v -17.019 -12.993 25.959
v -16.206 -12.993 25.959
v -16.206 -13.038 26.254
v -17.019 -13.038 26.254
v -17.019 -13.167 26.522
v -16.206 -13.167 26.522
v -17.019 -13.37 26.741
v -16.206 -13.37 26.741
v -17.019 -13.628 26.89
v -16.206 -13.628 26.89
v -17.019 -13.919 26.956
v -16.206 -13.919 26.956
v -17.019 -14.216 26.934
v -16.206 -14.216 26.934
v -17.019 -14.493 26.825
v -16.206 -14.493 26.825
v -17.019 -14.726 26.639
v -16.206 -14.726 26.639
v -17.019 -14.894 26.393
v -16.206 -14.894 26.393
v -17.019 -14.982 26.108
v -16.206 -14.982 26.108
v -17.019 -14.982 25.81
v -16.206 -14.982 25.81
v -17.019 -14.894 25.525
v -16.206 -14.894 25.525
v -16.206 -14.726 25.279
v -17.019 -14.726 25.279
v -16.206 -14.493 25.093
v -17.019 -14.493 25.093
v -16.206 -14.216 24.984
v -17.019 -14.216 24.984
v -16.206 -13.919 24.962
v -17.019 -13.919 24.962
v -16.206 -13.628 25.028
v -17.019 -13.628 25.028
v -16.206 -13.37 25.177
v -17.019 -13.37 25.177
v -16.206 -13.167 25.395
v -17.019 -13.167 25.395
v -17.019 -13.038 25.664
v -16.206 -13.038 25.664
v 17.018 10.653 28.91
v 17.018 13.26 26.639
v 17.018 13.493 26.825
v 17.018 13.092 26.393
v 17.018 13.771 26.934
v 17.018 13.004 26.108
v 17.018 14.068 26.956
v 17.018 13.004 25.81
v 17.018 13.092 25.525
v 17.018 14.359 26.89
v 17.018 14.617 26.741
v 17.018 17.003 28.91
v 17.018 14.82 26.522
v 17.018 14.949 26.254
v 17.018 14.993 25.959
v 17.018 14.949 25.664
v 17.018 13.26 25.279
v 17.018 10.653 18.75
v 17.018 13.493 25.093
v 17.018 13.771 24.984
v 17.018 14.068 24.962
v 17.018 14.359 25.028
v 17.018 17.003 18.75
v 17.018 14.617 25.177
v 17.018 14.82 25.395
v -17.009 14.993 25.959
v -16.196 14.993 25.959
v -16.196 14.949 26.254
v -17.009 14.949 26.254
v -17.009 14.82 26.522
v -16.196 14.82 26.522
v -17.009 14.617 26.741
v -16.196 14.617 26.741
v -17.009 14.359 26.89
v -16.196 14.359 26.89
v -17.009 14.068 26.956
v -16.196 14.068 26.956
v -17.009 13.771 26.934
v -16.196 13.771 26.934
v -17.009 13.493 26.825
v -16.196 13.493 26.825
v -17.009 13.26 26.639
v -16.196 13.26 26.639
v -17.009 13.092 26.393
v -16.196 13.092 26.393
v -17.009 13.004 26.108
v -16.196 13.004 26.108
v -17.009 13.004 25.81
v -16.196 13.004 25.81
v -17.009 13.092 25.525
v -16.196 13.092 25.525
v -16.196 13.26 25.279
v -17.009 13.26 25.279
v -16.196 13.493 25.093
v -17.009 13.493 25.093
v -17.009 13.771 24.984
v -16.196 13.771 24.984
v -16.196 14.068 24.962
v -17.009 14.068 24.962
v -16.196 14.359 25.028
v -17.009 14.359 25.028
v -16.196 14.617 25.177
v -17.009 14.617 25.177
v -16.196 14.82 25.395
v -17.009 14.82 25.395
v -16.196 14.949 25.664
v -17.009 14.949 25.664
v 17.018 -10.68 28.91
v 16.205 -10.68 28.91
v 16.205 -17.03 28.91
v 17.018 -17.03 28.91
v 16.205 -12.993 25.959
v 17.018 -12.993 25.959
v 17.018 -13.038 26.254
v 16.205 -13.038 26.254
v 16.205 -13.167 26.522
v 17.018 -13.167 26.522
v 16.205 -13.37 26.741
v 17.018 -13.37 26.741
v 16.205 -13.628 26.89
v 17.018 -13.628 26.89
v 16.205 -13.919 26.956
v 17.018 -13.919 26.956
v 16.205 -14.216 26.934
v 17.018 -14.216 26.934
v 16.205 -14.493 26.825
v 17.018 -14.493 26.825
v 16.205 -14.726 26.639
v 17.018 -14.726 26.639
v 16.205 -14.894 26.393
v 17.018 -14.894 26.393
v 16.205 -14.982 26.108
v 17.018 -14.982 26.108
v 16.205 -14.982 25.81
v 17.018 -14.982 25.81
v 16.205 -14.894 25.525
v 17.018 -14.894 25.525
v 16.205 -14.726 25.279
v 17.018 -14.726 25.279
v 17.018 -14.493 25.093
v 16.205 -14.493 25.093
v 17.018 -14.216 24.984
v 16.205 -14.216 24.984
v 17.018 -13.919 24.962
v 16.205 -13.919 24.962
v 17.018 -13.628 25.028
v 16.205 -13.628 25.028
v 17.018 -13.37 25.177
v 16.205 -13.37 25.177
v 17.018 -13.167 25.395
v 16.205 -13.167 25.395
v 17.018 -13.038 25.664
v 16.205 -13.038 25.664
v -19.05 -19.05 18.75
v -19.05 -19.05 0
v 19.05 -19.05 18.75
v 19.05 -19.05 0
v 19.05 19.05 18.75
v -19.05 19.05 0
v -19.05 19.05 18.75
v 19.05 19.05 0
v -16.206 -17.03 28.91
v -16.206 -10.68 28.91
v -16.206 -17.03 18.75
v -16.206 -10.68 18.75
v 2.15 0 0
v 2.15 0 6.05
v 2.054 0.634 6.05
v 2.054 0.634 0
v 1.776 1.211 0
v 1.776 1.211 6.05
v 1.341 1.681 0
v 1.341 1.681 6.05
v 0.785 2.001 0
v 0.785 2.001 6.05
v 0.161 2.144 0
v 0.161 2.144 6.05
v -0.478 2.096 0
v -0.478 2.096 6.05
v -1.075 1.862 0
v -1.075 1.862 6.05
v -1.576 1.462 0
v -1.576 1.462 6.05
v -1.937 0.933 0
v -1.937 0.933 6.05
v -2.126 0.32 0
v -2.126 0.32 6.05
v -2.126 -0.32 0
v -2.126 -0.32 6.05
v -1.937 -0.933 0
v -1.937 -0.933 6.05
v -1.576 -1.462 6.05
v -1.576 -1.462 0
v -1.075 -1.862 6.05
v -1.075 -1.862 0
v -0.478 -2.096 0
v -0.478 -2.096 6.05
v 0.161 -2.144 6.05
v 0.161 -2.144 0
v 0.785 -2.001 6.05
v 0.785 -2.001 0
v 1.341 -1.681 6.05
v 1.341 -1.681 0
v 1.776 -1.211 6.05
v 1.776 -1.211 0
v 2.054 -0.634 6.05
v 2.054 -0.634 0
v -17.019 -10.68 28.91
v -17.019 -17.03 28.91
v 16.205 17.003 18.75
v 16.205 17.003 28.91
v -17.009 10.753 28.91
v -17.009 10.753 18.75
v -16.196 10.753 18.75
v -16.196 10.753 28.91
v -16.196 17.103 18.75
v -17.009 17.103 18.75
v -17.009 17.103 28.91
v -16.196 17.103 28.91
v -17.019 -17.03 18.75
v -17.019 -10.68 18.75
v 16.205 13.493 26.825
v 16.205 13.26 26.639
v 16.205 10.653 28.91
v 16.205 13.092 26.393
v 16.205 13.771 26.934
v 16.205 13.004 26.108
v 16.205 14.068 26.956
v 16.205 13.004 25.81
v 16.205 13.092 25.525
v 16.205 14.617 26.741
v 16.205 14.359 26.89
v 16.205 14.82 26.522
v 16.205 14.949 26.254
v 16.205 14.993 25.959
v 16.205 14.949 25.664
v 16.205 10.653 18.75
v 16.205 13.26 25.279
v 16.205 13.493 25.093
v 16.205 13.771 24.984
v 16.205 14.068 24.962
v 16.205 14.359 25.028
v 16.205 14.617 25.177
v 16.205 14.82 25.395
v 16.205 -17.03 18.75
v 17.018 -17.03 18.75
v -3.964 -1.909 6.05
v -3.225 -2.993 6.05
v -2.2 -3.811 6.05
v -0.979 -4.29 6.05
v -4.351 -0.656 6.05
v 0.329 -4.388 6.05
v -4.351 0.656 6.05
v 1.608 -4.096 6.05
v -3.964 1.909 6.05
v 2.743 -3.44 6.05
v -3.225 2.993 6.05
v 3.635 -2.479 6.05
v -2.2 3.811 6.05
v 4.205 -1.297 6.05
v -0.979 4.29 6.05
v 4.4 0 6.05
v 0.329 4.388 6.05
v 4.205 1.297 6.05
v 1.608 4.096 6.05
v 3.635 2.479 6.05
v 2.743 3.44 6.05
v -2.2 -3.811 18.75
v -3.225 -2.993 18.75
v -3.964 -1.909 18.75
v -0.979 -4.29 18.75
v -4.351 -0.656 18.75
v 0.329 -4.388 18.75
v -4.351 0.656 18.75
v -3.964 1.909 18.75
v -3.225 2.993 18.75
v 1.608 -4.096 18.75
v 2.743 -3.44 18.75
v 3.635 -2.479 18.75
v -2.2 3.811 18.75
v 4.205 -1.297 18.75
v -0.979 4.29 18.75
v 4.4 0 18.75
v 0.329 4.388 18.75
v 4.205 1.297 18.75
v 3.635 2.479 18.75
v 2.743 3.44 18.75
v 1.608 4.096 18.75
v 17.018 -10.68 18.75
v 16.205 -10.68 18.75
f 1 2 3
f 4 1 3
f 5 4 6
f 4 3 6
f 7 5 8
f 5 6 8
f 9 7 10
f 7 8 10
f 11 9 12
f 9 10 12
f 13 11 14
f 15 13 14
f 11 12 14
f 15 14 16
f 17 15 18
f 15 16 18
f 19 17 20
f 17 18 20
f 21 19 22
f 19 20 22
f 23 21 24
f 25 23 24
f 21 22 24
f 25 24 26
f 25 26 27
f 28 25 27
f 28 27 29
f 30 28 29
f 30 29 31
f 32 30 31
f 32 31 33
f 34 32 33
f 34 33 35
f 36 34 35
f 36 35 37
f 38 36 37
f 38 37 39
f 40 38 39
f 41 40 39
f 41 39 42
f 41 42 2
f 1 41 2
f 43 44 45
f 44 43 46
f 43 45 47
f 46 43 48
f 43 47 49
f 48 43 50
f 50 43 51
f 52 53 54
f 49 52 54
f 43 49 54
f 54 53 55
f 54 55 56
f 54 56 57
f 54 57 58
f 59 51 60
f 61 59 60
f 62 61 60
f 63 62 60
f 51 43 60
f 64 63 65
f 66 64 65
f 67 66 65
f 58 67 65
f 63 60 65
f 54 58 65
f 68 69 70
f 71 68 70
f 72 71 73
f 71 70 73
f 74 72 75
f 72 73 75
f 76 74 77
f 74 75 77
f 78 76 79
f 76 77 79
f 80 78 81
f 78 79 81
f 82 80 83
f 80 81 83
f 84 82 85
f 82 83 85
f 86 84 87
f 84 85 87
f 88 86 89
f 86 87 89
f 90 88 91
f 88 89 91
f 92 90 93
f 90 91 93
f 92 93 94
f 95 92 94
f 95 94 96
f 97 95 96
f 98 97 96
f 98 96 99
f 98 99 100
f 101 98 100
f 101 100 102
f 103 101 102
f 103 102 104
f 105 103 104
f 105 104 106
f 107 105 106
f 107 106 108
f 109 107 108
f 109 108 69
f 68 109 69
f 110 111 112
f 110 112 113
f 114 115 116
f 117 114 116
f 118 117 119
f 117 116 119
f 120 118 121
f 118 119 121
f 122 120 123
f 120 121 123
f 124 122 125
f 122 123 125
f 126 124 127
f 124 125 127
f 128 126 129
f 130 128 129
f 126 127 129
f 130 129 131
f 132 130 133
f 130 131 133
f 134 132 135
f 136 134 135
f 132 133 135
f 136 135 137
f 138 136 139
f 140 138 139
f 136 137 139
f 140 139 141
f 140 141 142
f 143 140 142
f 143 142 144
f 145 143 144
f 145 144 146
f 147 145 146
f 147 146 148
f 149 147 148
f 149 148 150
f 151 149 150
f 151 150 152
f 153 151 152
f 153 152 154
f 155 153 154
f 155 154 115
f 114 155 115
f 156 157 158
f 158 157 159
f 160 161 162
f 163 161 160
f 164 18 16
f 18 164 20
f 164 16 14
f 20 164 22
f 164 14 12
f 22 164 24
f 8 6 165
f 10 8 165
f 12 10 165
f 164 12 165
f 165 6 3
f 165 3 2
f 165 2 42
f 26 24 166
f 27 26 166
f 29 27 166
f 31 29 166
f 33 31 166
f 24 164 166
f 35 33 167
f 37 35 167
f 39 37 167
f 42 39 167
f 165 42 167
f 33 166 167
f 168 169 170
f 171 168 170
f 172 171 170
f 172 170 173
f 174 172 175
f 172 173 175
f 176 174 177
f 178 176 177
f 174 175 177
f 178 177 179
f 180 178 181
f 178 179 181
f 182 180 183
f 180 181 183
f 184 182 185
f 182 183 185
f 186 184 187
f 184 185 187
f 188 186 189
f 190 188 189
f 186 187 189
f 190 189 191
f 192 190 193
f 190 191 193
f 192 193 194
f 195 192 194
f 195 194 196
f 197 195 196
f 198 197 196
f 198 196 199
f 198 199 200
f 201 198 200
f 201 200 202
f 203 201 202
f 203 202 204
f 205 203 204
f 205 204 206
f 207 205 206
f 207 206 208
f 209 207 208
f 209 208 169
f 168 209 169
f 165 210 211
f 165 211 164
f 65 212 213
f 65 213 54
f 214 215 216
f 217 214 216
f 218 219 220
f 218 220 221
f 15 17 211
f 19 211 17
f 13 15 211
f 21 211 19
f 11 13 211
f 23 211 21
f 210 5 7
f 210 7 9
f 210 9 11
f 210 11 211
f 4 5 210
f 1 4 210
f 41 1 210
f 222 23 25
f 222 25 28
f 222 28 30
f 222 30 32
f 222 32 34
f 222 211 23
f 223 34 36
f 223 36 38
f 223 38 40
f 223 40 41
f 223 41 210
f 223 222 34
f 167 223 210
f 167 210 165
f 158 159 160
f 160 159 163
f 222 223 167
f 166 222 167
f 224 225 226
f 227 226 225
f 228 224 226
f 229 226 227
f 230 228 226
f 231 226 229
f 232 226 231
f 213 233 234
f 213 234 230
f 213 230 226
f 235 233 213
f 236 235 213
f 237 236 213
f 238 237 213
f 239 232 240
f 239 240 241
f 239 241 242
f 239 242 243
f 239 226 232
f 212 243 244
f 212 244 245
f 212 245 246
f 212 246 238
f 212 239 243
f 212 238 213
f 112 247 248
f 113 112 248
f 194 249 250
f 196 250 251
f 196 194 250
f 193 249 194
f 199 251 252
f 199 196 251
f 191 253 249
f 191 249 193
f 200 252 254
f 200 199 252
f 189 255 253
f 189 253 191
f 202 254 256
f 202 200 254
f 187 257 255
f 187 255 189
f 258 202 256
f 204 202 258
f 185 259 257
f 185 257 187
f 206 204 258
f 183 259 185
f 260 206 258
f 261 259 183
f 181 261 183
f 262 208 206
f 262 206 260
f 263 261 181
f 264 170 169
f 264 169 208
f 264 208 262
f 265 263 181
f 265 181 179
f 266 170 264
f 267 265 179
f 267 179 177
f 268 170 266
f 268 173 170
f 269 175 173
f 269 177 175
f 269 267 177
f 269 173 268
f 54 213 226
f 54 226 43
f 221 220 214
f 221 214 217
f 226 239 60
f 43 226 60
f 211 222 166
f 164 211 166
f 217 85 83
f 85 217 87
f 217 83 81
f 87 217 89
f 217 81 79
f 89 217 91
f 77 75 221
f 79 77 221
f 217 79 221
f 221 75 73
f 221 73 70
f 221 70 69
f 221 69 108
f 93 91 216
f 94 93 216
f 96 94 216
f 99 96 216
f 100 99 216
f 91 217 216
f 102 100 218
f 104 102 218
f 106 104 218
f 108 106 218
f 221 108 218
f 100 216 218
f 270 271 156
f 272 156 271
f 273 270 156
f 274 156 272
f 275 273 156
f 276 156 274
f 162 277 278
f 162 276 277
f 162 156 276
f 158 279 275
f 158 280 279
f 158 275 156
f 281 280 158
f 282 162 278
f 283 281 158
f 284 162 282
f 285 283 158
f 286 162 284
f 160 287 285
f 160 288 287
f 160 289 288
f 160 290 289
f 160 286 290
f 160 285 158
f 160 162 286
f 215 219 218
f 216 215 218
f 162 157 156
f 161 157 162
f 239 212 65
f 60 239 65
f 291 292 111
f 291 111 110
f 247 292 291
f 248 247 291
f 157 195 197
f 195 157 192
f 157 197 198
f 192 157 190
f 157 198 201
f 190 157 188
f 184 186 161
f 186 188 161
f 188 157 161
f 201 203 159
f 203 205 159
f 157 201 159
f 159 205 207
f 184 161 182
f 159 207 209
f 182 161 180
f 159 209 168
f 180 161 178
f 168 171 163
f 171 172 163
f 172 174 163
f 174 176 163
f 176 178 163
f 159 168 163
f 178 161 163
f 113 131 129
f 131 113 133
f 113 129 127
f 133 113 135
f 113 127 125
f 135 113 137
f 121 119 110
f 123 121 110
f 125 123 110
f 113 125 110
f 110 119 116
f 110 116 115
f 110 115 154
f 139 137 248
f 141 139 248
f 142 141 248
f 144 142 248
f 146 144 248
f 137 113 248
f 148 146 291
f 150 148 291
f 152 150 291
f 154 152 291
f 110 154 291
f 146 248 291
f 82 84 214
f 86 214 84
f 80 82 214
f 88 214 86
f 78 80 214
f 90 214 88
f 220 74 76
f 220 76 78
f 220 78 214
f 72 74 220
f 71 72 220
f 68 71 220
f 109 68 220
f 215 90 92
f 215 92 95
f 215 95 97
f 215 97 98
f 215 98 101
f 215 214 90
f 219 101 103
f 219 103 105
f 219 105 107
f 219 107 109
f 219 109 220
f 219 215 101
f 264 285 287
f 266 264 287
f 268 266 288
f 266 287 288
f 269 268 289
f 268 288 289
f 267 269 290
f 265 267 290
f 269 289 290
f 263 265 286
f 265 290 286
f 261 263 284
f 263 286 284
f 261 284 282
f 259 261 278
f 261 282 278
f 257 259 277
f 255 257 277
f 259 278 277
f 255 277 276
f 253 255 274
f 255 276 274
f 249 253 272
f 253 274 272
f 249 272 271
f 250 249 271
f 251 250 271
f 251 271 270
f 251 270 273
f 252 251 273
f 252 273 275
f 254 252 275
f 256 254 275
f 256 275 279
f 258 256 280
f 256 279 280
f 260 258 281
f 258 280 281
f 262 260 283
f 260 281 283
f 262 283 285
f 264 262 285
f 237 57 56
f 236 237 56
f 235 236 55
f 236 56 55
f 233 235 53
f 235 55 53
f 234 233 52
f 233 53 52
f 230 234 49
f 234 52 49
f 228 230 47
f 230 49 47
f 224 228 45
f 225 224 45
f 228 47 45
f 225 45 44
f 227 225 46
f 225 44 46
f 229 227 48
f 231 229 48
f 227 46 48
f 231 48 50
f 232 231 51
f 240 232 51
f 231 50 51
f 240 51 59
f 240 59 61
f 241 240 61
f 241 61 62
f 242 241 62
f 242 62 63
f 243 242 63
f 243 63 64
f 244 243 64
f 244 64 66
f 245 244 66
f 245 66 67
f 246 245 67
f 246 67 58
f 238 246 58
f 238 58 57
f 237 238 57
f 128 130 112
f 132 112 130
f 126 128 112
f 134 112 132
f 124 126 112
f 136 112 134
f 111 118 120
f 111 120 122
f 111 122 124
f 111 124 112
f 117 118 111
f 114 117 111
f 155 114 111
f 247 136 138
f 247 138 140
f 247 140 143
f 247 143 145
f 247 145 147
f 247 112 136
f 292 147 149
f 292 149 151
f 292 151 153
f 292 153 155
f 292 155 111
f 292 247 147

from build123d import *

# Parameters (mm, degrees)
F0_W      = 38.1
F0_H      = 38.1
F1_DEPTH  = 18.75
F2_R      = 2.15
F3_DEPTH  = 18.75
F2_R_2    = 4.4
F4_DEPTH  = 12.7
F5_W      = 0.8128
F5_H      = 6.35
F6_DEPTH  = 10.16
F5_W_2    = 0.813
F10_R     = 1
F11_DEPTH = 40


with BuildPart() as f1:
    # F0 (on Top) → F1 (new body)
    with BuildSketch(Plane.XY):
        Rectangle(F0_W, F0_H)
    extrude(amount=F1_DEPTH)

    # F2 (on face) → F3 (cut)
    with BuildSketch(Plane.XY.offset(18.75)):
        Circle(F2_R)
    extrude(amount=-F3_DEPTH, mode=Mode.SUBTRACT)

    # F2 (on face) → F4 (cut)
    with BuildSketch(Plane.XY.offset(18.75)):
        Circle(F2_R_2)
        Circle(F2_R, mode=Mode.SUBTRACT)
    extrude(amount=-F4_DEPTH, mode=Mode.SUBTRACT)


with BuildPart() as f6:
    # F5 (on face) → F6 (new body)
    with BuildSketch(Plane.XY.offset(18.75)):
        with Locations((-16.6121960382, -13.8547737718)):
            Rectangle(F5_W, F5_H)
    extrude(amount=F6_DEPTH)


with BuildPart() as f6b:
    # F5 (on face) → F6, piece 2 (new body)
    with BuildSketch(Plane.XY.offset(18.75)):
        with Locations((16.6111253681, -13.8547737718)):
            Rectangle(F5_W_2, F5_H)
    extrude(amount=F6_DEPTH)


with BuildPart() as f6c:
    # F5 (on face) → F6, piece 3 (new body)
    with BuildSketch(Plane.XY.offset(18.75)):
        with Locations((16.6111253681, 13.8284788102)):
            Rectangle(F5_W_2, F5_H)
    extrude(amount=F6_DEPTH)


with BuildPart() as f6d:
    # F5 (on face) → F6, piece 4 (new body)
    with BuildSketch(Plane.XY.offset(18.75)):
        with Locations((-15.7704279306, 13.3477284491)):
            Rectangle(F5_W_2, F5_H)
    extrude(amount=F6_DEPTH)


with BuildPart() as f6d_1:
    # F7: moved
    add(f6d.part.moved(Location((-0.832, 0.58, 0))))


with BuildPart() as f11_tool:
    # F10 (on plane+point) → F11 (new body)
    with BuildSketch(Plane.YZ.offset(17.0176253681)):
        with Locations((-13.9932865277, 25.9587639272)):
            Circle(F10_R)
        with Locations((13.9932865277, 25.9587639272)):
            Circle(F10_R)
    extrude(amount=-F11_DEPTH)


with BuildPart() as f6_1:
    add(f6.part)

    # F11: cut by f11_tool
    add(f11_tool.part, mode=Mode.SUBTRACT)


with BuildPart() as f6b_1:
    add(f6b.part)

    # F11: cut by f11_tool
    add(f11_tool.part, mode=Mode.SUBTRACT)


with BuildPart() as f6c_1:
    add(f6c.part)

    # F11: cut by f11_tool
    add(f11_tool.part, mode=Mode.SUBTRACT)


with BuildPart() as f6d_2:
    add(f6d_1.part)

    # F11: cut by f11_tool
    add(f11_tool.part, mode=Mode.SUBTRACT)


solid = Compound([f1.part, f6_1.part, f6b_1.part, f6c_1.part, f6d_2.part])
